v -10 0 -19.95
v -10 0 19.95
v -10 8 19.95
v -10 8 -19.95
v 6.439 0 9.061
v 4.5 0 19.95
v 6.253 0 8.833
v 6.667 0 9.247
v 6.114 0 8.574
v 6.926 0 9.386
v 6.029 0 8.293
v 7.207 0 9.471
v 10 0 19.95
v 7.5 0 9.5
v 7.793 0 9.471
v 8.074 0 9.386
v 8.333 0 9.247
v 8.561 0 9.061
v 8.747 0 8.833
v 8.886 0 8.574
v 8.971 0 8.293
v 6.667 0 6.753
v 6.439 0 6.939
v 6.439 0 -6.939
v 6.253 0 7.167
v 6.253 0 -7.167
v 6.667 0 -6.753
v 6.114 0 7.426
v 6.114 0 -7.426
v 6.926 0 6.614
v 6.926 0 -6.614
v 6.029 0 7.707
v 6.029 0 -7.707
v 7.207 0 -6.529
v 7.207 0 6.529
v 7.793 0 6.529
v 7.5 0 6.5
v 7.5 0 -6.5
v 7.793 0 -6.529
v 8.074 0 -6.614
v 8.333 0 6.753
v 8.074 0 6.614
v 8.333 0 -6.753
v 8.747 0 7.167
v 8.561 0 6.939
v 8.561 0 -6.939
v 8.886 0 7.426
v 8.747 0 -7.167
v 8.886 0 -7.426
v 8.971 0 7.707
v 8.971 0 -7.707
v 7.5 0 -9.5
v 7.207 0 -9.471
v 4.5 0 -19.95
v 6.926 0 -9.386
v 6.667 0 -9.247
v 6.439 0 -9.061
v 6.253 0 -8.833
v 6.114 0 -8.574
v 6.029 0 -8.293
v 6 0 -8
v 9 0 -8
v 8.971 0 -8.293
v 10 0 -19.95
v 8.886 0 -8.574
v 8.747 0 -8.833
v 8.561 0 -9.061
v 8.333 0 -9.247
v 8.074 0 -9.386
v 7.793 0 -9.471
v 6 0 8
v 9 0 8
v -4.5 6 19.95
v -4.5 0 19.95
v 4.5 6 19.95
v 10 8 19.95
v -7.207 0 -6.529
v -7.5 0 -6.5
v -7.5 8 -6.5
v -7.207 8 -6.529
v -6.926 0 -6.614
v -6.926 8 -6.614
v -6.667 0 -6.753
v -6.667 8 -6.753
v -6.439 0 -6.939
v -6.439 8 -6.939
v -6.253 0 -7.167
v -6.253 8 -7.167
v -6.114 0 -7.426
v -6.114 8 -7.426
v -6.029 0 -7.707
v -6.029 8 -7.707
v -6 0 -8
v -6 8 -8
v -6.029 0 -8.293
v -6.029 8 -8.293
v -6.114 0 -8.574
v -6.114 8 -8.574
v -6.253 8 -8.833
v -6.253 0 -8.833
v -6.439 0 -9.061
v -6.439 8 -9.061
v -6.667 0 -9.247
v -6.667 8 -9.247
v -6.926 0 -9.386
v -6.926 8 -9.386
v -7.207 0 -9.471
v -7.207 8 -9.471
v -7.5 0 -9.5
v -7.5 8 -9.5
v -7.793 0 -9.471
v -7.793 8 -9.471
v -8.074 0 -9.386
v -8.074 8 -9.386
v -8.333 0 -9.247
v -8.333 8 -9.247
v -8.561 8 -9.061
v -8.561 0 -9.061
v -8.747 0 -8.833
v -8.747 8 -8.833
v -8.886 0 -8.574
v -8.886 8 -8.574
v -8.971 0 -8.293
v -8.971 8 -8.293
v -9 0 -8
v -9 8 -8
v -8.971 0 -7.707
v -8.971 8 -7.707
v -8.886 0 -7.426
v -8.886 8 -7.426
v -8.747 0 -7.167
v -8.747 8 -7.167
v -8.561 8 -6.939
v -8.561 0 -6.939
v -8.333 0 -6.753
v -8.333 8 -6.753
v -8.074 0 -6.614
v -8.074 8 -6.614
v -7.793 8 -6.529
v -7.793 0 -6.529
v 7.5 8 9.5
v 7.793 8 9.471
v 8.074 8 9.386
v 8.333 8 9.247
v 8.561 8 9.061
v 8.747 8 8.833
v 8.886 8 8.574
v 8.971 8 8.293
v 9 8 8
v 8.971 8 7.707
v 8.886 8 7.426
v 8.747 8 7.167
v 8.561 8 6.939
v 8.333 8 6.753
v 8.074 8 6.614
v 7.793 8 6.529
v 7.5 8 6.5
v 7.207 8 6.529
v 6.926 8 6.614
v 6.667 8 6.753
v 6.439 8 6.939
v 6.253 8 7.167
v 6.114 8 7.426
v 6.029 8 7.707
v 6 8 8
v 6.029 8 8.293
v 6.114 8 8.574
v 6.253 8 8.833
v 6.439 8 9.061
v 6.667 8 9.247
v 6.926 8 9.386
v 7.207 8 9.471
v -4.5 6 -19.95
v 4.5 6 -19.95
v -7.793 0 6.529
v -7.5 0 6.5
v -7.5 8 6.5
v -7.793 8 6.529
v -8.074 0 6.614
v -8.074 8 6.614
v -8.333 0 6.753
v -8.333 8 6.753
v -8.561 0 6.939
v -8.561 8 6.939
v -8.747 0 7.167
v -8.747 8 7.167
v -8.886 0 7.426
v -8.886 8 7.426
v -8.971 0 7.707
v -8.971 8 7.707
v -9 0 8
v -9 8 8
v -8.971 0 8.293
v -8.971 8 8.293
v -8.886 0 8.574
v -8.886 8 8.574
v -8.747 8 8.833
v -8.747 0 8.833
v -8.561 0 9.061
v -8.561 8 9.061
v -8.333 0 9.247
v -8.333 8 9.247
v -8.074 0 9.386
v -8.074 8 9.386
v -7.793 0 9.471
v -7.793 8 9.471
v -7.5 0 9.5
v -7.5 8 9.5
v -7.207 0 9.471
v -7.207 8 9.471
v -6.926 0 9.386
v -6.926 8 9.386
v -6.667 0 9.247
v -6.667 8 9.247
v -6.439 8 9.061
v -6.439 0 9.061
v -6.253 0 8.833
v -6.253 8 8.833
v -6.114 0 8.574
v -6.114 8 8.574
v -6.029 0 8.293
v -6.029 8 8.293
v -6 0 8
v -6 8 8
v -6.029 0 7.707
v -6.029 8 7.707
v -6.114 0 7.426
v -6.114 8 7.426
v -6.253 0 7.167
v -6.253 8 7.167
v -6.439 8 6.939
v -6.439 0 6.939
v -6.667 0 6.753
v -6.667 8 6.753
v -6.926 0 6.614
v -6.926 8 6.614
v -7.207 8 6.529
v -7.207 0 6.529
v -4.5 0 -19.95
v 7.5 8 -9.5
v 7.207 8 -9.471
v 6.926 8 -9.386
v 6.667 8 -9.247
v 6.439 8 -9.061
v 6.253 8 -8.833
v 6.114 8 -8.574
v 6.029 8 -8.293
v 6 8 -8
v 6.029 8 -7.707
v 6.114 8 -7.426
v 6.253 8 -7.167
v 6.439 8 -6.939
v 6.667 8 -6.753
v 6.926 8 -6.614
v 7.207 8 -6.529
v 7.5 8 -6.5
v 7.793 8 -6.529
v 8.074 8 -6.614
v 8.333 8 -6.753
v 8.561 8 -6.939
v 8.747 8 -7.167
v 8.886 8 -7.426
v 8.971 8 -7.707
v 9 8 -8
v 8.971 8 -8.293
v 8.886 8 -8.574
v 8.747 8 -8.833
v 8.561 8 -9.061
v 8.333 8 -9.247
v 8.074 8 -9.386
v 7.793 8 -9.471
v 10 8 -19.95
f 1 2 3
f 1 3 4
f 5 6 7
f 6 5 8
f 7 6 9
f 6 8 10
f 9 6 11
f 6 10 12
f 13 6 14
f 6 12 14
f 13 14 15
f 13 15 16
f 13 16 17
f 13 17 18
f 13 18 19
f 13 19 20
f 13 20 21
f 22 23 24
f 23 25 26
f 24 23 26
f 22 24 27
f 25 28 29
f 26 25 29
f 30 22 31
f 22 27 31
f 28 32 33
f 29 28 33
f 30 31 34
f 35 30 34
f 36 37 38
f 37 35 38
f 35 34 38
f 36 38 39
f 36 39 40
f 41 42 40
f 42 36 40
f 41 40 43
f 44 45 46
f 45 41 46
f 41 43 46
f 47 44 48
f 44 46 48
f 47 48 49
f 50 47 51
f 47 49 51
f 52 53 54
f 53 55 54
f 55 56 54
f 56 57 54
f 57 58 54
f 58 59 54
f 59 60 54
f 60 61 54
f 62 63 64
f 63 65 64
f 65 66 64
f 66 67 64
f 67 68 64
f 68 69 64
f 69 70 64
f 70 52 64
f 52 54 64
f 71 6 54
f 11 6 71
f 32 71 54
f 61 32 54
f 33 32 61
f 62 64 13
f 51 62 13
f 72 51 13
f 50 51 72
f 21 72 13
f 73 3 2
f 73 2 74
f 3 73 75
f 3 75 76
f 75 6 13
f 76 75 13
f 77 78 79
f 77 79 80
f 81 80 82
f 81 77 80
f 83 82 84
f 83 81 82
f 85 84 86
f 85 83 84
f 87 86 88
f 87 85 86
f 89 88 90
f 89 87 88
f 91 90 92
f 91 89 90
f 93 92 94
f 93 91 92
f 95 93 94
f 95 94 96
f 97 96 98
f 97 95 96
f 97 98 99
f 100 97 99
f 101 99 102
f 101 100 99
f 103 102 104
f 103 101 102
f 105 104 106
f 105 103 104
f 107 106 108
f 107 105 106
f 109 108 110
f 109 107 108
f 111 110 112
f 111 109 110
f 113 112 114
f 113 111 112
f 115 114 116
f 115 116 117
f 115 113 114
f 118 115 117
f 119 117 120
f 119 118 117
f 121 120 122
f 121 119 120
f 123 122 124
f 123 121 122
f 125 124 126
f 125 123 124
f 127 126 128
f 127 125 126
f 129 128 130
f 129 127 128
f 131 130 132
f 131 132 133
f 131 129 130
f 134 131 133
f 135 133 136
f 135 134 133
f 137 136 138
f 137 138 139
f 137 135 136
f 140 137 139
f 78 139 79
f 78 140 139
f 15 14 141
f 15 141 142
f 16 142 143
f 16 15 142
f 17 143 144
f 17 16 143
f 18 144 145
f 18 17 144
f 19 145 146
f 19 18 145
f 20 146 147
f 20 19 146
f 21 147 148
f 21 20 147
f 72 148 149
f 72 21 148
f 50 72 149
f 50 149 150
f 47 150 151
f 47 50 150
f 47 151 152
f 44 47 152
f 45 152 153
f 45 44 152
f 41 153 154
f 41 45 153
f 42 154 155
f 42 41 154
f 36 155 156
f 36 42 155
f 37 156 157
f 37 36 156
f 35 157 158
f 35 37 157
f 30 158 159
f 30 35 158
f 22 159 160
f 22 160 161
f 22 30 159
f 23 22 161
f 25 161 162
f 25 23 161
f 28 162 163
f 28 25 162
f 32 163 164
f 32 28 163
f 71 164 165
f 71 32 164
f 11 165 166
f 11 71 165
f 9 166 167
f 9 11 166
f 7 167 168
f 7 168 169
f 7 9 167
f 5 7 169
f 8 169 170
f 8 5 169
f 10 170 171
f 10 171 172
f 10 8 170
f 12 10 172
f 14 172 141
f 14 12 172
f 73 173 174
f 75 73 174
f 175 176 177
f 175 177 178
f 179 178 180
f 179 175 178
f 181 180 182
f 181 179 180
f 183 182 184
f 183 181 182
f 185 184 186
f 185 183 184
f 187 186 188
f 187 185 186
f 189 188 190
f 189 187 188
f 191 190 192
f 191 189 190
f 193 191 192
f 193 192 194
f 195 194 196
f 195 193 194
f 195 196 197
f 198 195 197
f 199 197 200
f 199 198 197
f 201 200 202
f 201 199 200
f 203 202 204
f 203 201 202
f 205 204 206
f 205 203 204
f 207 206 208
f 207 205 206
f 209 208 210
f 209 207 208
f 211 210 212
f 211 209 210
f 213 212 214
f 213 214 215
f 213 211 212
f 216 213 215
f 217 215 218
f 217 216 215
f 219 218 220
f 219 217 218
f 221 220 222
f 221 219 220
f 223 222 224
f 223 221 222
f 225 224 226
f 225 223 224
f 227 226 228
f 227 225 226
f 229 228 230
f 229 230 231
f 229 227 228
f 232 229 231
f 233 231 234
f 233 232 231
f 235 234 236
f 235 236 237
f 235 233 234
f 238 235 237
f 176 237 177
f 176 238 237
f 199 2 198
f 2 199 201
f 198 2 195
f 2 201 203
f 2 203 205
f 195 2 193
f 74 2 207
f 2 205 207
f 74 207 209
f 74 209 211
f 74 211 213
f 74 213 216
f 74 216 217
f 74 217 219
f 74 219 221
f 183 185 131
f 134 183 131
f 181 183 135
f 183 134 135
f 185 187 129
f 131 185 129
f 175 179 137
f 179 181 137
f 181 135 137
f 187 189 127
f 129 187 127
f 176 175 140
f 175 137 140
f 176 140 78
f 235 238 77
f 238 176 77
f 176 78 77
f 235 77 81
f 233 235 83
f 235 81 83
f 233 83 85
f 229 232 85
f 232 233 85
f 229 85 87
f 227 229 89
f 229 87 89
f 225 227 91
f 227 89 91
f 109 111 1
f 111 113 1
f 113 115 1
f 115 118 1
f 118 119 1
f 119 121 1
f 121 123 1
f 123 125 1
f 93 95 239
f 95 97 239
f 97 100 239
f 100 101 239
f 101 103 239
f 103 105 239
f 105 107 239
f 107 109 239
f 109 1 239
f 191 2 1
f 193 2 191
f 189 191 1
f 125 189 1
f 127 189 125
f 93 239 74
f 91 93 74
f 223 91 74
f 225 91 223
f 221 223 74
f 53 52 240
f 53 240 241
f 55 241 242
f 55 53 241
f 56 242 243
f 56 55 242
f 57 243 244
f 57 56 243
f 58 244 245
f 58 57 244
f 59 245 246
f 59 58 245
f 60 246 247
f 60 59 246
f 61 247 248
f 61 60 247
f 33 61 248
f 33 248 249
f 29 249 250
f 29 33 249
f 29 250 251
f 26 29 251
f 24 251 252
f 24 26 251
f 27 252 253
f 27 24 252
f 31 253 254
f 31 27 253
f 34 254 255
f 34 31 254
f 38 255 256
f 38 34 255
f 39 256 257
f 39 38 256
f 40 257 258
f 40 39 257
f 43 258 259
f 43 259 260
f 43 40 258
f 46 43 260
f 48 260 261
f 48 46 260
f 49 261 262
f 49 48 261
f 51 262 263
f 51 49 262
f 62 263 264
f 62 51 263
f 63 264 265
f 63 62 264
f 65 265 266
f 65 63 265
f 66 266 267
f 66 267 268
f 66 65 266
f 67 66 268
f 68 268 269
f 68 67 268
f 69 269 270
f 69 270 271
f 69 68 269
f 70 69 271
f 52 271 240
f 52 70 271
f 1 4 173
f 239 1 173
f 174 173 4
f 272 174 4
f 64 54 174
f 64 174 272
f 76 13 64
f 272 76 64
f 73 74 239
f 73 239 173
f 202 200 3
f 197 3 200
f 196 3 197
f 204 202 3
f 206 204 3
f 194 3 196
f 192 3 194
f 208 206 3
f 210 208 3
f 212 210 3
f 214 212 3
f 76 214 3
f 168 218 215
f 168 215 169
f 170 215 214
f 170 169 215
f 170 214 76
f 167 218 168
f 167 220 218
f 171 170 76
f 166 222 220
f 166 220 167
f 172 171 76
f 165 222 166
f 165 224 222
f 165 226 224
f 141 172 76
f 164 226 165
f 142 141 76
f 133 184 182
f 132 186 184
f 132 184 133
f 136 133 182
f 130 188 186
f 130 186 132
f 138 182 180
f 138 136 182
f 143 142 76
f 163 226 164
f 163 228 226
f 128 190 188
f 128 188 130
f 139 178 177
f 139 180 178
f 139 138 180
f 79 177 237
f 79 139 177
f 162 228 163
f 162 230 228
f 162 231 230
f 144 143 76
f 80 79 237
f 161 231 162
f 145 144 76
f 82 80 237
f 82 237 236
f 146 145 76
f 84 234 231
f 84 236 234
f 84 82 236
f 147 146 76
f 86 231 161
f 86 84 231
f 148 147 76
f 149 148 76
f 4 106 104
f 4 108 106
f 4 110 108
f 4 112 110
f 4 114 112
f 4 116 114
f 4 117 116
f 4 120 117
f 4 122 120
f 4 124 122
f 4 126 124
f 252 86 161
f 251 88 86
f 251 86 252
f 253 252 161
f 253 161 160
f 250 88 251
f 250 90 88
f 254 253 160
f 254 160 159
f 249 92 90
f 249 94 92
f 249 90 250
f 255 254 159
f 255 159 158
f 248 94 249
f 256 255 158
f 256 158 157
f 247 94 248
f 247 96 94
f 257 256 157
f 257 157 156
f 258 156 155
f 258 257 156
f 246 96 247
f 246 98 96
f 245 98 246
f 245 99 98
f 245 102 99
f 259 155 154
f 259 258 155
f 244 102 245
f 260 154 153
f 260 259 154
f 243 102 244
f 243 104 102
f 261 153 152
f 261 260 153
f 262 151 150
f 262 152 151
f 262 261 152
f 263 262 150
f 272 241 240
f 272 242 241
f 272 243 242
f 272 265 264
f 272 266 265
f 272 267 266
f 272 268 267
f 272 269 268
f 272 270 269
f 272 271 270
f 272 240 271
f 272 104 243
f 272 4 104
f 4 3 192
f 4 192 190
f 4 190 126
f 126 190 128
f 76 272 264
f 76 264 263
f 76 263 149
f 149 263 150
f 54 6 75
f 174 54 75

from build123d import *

# Parameters (mm, degrees)
SKETCH_1_W          = 20
SKETCH_1_H          = 39.9
SKETCH_1_R          = 1.5
EXTRUDE_1_DEPTH     = 8
SKETCH_2_W          = 9
SKETCH_2_H          = 6
CUT_EXTRUDE_1_DEPTH = 60


with BuildPart() as part:
    # 草图1 → 凸台-拉伸1 (new body)
    with BuildSketch(Plane(origin=(0, 0, 0), x_dir=(1, 0, 0), z_dir=(0, 1, 0))):
        Rectangle(SKETCH_1_W, SKETCH_1_H)
        with Locations(Location((-7.5, 8, 0), (0, 0, 270))):
            Circle(SKETCH_1_R, mode=Mode.SUBTRACT)
        with Locations(Location((-7.5, -8, 0), (0, 0, 90))):
            Circle(SKETCH_1_R, mode=Mode.SUBTRACT)
        with Locations(Location((7.5, -8, 0), (0, 0, 270))):
            Circle(SKETCH_1_R, mode=Mode.SUBTRACT)
        with Locations(Location((7.5, 8, 0), (0, 0, 90))):
            Circle(SKETCH_1_R, mode=Mode.SUBTRACT)
    extrude(amount=EXTRUDE_1_DEPTH)

    # 草图2 → 切除-拉伸1 (cut)
    with BuildSketch(Plane.XY.offset(19.95)):
        with Locations((0, 3)):
            Rectangle(SKETCH_2_W, SKETCH_2_H)
    extrude(amount=-CUT_EXTRUDE_1_DEPTH, mode=Mode.SUBTRACT)


solid = part.part
